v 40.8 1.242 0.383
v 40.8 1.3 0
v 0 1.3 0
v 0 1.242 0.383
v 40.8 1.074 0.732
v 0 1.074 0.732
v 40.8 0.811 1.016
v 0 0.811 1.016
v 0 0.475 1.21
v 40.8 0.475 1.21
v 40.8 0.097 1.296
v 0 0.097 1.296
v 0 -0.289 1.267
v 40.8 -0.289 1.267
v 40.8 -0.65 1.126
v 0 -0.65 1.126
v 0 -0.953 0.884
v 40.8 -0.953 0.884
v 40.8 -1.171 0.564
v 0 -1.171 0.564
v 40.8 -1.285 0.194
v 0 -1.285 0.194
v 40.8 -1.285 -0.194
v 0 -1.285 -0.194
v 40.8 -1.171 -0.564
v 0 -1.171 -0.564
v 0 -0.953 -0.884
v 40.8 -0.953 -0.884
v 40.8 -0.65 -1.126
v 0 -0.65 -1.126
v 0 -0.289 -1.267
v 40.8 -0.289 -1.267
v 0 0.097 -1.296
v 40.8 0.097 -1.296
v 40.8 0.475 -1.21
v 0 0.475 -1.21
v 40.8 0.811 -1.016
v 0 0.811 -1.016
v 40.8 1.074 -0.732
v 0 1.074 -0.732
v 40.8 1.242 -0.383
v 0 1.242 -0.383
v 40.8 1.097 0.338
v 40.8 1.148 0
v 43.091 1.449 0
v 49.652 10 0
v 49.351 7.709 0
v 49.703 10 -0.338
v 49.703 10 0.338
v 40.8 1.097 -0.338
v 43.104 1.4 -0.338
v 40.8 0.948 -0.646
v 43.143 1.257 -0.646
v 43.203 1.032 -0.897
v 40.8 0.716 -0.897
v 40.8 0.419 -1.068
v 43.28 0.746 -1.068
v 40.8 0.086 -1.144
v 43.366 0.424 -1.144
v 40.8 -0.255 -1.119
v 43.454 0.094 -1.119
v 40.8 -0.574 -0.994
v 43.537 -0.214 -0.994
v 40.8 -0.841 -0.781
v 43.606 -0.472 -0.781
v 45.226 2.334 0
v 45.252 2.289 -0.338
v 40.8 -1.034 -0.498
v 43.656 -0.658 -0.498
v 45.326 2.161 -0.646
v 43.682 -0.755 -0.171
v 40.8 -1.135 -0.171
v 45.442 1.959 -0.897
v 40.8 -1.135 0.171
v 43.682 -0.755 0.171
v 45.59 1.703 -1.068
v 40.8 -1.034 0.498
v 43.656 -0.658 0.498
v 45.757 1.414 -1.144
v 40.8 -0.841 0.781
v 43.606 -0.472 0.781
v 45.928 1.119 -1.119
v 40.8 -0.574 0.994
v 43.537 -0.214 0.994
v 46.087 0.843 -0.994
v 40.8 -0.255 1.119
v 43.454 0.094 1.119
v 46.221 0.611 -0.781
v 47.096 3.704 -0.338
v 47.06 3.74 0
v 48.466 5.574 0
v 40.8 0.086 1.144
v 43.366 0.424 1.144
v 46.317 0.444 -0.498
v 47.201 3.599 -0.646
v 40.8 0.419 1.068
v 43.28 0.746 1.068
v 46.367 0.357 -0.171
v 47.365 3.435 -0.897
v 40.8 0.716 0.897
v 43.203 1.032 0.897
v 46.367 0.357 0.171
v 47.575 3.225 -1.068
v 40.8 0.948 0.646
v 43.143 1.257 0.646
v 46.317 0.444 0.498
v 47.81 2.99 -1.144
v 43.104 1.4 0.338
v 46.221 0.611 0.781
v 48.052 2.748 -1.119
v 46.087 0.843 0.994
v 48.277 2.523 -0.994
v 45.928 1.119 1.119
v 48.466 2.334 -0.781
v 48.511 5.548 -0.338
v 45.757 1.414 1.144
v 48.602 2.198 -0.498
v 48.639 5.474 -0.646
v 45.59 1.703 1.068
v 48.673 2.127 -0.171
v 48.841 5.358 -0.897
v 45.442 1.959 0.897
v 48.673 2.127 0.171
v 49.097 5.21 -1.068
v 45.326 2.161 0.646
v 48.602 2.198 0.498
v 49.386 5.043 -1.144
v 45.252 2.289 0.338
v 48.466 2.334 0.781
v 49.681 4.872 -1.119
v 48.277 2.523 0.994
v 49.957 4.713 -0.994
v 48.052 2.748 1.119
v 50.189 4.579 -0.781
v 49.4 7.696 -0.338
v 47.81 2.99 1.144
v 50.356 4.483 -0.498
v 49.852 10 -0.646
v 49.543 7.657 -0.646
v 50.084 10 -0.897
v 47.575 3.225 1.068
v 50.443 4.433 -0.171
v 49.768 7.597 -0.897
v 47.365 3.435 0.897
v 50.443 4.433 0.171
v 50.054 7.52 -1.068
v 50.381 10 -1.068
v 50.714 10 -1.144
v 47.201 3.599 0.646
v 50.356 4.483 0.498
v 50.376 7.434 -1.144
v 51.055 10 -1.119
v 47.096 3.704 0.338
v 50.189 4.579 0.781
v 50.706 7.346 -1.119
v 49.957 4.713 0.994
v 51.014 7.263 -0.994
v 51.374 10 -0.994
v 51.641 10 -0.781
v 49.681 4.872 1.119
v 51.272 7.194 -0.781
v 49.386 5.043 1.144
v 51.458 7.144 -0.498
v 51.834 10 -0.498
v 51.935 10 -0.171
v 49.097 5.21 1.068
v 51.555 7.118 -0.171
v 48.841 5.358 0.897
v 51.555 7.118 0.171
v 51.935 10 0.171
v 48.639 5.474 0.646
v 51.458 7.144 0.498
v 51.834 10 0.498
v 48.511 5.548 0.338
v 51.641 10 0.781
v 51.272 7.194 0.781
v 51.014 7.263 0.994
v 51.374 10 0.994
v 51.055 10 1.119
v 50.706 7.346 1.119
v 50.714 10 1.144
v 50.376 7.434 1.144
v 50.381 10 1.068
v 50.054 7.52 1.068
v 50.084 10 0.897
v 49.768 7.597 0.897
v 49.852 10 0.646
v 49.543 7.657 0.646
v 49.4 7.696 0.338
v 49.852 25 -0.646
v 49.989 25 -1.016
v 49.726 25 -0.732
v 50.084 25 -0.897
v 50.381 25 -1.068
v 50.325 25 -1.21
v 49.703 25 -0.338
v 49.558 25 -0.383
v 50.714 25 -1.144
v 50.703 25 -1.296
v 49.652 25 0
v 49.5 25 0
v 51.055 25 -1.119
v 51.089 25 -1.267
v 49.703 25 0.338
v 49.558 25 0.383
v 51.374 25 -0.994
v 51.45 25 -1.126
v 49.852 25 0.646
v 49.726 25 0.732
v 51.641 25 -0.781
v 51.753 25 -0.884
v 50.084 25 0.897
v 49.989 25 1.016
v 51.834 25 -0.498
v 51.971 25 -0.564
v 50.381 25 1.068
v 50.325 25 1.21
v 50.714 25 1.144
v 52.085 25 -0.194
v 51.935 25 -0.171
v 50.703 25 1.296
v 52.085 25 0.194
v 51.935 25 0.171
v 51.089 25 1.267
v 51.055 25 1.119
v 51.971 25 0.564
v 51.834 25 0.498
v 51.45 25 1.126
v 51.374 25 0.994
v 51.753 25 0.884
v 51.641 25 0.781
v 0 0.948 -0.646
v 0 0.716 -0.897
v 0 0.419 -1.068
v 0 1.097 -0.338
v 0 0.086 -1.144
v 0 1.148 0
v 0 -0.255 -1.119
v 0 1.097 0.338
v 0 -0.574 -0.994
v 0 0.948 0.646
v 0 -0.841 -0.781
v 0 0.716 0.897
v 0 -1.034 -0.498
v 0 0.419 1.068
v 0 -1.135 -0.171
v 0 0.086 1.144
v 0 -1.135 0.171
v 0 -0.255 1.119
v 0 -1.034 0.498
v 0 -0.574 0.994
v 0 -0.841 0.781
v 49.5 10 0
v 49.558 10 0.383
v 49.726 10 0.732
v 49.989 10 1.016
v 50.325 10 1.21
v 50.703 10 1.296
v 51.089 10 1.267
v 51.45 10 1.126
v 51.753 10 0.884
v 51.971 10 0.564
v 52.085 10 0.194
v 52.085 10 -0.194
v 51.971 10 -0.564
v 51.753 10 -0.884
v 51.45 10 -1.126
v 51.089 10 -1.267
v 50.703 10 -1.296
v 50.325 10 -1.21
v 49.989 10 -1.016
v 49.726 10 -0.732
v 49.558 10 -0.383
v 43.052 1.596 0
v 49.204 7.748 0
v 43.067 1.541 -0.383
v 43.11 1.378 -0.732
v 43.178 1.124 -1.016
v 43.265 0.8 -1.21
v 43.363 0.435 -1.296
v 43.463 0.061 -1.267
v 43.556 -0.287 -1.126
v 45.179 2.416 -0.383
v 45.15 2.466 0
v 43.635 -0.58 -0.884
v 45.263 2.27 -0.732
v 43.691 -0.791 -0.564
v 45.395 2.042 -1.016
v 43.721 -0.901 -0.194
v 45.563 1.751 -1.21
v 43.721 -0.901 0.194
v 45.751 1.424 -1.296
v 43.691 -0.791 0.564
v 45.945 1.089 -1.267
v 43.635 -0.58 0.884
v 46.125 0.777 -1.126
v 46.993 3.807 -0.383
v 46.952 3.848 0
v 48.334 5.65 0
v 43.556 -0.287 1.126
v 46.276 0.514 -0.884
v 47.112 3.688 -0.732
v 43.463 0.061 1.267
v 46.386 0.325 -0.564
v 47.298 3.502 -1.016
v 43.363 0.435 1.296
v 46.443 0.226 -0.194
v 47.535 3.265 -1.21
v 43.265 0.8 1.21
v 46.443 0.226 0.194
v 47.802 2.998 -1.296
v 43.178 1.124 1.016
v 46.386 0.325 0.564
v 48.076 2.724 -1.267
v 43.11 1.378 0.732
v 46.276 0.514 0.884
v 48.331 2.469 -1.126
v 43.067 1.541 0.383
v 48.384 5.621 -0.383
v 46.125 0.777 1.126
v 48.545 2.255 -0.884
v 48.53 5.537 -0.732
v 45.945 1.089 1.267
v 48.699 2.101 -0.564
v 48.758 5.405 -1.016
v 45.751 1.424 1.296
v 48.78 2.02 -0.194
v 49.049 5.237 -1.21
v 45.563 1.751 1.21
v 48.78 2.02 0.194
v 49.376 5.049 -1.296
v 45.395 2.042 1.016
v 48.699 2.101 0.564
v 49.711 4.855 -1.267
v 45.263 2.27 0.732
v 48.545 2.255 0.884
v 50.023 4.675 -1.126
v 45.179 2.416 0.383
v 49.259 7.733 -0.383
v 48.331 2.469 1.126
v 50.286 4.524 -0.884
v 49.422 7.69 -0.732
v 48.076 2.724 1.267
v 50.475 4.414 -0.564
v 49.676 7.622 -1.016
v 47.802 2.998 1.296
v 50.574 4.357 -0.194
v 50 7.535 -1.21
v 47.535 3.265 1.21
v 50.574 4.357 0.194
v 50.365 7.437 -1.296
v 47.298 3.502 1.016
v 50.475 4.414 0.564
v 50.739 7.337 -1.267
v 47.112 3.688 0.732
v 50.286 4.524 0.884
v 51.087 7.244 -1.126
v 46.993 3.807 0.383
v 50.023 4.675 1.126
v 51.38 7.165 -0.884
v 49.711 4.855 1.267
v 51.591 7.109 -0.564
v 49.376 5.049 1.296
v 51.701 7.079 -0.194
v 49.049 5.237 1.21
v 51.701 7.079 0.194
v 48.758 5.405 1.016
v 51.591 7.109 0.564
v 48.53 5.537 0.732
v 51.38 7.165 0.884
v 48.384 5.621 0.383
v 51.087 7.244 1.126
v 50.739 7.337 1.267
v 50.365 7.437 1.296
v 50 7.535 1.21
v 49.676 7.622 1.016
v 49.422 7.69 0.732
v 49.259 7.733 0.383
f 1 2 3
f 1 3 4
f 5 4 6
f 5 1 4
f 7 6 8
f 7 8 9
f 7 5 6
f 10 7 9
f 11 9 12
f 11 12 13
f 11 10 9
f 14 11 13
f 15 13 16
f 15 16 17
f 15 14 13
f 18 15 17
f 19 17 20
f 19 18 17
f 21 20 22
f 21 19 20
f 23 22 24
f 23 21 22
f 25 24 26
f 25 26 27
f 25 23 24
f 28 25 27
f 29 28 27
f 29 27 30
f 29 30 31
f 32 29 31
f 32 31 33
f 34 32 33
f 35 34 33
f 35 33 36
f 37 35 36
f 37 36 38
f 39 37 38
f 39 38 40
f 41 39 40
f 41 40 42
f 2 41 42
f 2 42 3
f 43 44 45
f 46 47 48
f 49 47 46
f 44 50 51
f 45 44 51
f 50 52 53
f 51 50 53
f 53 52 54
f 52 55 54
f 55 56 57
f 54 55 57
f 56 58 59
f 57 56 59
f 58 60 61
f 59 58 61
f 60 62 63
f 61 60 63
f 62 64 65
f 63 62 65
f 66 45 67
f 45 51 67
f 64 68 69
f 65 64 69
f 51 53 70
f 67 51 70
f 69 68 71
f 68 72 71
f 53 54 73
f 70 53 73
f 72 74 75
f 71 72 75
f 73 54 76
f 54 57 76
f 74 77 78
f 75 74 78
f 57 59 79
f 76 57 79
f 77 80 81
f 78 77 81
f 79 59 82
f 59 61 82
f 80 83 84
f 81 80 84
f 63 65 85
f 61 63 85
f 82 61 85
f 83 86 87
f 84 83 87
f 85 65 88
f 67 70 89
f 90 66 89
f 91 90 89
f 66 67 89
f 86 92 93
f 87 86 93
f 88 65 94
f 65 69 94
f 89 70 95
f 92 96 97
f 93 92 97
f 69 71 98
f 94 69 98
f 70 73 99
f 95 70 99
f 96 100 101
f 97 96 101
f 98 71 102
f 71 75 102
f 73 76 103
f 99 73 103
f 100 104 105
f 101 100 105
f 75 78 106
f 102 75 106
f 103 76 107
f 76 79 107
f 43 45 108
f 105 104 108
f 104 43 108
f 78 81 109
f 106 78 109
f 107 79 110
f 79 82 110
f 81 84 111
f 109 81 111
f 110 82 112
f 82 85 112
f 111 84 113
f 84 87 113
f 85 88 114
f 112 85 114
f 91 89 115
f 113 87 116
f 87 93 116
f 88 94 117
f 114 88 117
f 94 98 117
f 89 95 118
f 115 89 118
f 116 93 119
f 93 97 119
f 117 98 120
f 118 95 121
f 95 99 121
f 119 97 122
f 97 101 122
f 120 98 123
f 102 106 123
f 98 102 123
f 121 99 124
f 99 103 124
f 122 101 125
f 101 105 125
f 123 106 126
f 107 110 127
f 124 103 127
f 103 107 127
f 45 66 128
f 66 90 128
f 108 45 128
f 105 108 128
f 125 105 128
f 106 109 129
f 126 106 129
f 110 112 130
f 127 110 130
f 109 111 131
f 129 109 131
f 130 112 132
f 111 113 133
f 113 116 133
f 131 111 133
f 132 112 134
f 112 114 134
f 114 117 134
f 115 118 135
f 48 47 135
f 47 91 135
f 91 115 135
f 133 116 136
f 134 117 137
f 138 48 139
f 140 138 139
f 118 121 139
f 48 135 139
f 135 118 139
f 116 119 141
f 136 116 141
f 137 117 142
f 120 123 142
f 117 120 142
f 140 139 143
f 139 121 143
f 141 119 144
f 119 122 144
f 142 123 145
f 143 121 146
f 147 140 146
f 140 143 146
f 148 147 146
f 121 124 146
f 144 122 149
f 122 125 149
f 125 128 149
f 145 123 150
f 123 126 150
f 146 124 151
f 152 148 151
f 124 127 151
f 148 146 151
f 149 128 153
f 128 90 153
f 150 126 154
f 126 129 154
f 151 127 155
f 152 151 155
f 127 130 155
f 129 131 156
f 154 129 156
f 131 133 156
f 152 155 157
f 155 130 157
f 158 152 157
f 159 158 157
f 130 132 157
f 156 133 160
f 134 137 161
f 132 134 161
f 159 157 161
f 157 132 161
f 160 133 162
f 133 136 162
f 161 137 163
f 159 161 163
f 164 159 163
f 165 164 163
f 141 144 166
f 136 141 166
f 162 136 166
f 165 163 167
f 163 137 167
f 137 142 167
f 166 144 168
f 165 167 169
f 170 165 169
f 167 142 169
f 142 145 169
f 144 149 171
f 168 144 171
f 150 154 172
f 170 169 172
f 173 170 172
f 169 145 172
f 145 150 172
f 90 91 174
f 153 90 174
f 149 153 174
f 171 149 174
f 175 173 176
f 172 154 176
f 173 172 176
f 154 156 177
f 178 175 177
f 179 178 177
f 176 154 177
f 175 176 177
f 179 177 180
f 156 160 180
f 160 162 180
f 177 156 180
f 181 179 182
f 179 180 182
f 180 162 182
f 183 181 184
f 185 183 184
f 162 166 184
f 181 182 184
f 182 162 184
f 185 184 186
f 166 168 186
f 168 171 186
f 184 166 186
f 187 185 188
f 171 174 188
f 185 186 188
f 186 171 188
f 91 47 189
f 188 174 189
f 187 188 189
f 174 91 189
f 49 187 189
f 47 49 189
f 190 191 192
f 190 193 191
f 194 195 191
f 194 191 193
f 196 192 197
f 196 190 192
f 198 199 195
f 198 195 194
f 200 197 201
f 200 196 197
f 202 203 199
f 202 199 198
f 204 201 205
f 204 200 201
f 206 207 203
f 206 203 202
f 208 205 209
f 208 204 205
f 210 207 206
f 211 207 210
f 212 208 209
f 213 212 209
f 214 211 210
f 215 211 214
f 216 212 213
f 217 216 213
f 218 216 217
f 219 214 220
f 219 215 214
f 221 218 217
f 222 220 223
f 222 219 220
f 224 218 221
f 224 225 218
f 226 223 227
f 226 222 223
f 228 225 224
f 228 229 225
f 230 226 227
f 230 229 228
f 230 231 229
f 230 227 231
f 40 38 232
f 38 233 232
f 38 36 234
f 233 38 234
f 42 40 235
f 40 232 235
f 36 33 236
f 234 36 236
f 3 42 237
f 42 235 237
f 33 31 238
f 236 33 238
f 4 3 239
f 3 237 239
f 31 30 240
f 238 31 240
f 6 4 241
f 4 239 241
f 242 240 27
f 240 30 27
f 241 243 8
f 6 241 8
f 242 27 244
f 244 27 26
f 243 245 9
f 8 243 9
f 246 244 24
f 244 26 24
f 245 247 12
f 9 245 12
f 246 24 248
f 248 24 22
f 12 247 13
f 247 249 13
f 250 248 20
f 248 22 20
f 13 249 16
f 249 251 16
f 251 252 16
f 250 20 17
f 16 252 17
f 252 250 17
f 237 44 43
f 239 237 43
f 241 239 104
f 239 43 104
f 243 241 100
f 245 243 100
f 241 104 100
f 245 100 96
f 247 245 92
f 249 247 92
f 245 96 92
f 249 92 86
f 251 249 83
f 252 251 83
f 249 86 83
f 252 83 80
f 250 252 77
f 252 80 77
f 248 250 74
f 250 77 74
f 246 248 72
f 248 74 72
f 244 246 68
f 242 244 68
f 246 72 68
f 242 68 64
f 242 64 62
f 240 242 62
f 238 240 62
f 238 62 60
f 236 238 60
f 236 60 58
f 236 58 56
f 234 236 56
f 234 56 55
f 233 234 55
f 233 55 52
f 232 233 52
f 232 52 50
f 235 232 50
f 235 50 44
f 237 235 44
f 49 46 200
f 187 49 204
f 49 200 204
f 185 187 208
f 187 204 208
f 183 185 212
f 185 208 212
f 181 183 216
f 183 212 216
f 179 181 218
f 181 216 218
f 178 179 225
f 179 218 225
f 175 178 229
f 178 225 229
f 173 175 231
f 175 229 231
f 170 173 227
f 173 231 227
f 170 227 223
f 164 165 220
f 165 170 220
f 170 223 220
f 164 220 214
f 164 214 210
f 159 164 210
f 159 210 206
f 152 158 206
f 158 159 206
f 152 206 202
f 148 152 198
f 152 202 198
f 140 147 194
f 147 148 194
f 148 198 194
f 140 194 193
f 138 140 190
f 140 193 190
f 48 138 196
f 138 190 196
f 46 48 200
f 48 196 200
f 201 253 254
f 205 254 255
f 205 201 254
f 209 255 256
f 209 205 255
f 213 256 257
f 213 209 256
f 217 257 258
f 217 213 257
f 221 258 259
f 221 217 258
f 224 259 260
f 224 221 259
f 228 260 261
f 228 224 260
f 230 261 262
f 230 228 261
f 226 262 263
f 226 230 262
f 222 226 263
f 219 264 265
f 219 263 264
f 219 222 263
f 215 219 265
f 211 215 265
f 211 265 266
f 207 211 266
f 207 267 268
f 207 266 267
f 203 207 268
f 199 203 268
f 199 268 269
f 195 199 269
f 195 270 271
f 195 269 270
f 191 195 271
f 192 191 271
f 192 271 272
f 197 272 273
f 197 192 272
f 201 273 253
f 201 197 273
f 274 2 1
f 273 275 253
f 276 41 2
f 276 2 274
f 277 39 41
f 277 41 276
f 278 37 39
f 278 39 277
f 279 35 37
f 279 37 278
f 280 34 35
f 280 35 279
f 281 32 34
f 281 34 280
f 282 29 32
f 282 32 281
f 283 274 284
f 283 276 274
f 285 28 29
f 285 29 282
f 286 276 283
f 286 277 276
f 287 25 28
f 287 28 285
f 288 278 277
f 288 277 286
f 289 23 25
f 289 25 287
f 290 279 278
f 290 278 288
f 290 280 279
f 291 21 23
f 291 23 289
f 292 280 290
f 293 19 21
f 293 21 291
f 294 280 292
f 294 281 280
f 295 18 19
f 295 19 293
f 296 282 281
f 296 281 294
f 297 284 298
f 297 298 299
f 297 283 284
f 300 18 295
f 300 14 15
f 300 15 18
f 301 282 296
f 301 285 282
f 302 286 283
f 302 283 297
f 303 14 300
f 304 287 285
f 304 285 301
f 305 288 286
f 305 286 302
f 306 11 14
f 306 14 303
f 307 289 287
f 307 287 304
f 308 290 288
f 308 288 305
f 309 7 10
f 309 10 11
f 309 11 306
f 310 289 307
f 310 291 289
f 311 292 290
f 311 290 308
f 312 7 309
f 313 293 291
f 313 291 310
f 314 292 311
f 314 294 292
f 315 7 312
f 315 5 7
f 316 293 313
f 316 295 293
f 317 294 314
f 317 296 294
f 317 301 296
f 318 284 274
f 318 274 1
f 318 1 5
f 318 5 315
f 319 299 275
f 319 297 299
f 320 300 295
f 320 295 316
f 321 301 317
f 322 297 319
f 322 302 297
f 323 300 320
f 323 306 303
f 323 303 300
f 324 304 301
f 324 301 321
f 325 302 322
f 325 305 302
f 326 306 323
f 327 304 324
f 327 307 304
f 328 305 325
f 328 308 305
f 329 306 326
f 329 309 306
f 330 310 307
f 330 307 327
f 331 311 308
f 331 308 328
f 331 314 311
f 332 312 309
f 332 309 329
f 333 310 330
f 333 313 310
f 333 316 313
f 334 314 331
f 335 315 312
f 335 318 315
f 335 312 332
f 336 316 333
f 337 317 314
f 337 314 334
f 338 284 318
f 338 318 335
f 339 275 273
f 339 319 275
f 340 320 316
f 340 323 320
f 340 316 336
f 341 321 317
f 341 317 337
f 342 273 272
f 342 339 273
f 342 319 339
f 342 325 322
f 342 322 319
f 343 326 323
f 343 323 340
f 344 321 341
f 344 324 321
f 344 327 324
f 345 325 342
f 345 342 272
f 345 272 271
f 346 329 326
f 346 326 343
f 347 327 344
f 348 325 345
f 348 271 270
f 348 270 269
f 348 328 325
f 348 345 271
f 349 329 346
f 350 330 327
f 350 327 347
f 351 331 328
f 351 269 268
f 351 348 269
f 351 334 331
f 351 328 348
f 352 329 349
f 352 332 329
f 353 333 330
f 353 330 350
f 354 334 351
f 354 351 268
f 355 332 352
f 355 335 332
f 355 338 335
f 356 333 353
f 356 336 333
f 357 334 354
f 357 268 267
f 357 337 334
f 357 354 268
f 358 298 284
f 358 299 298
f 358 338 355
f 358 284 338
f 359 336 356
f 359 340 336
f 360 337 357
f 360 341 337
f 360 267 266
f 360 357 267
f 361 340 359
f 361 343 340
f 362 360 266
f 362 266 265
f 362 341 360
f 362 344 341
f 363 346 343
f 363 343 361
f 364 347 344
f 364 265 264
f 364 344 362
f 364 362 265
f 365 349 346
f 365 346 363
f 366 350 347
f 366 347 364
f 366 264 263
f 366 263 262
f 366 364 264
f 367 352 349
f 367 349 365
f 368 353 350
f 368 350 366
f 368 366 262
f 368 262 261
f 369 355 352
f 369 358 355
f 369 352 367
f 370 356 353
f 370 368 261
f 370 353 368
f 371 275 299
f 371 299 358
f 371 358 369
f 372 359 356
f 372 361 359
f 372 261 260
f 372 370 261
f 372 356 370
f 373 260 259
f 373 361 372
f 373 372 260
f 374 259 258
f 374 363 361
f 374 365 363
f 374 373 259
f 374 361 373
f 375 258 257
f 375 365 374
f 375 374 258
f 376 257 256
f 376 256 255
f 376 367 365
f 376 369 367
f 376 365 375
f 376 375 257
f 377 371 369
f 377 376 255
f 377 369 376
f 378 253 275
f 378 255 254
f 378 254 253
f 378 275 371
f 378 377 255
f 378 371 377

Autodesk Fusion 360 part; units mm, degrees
sketch "Sketch1" plane through (0, 0, 0) normal (1, 0, 0) x (0, 1, 0)
  circle A0 centre (0, 0) radius 1.3
  circle A1 centre (0, 0) radius 1.1476
  dimension "d1" = 2.6
  dimension "d2" = 2.2952
sketch "Sketch2" plane through (0, 0, 0) normal (0, 0, 1) x (1, 0, 0)
  line L0 (0, 0) -> (40.8, 0)
  line L1 (50.8, 10) -> (50.8, 25)
  arc A0 (40.8, 0) -> (50.8, 10) centre (40.8, 10) ccw
  point P0 (50.8, 0)
  dimension "d3" = 50.8
  dimension "d4" = 25
  dimension "d5" = 10
sweep "Sweep1" add profiles "Sketch1" path "Sketch2" along L0 A0 L1 section 1
equation "d2 = d1 - 0.012 in"
